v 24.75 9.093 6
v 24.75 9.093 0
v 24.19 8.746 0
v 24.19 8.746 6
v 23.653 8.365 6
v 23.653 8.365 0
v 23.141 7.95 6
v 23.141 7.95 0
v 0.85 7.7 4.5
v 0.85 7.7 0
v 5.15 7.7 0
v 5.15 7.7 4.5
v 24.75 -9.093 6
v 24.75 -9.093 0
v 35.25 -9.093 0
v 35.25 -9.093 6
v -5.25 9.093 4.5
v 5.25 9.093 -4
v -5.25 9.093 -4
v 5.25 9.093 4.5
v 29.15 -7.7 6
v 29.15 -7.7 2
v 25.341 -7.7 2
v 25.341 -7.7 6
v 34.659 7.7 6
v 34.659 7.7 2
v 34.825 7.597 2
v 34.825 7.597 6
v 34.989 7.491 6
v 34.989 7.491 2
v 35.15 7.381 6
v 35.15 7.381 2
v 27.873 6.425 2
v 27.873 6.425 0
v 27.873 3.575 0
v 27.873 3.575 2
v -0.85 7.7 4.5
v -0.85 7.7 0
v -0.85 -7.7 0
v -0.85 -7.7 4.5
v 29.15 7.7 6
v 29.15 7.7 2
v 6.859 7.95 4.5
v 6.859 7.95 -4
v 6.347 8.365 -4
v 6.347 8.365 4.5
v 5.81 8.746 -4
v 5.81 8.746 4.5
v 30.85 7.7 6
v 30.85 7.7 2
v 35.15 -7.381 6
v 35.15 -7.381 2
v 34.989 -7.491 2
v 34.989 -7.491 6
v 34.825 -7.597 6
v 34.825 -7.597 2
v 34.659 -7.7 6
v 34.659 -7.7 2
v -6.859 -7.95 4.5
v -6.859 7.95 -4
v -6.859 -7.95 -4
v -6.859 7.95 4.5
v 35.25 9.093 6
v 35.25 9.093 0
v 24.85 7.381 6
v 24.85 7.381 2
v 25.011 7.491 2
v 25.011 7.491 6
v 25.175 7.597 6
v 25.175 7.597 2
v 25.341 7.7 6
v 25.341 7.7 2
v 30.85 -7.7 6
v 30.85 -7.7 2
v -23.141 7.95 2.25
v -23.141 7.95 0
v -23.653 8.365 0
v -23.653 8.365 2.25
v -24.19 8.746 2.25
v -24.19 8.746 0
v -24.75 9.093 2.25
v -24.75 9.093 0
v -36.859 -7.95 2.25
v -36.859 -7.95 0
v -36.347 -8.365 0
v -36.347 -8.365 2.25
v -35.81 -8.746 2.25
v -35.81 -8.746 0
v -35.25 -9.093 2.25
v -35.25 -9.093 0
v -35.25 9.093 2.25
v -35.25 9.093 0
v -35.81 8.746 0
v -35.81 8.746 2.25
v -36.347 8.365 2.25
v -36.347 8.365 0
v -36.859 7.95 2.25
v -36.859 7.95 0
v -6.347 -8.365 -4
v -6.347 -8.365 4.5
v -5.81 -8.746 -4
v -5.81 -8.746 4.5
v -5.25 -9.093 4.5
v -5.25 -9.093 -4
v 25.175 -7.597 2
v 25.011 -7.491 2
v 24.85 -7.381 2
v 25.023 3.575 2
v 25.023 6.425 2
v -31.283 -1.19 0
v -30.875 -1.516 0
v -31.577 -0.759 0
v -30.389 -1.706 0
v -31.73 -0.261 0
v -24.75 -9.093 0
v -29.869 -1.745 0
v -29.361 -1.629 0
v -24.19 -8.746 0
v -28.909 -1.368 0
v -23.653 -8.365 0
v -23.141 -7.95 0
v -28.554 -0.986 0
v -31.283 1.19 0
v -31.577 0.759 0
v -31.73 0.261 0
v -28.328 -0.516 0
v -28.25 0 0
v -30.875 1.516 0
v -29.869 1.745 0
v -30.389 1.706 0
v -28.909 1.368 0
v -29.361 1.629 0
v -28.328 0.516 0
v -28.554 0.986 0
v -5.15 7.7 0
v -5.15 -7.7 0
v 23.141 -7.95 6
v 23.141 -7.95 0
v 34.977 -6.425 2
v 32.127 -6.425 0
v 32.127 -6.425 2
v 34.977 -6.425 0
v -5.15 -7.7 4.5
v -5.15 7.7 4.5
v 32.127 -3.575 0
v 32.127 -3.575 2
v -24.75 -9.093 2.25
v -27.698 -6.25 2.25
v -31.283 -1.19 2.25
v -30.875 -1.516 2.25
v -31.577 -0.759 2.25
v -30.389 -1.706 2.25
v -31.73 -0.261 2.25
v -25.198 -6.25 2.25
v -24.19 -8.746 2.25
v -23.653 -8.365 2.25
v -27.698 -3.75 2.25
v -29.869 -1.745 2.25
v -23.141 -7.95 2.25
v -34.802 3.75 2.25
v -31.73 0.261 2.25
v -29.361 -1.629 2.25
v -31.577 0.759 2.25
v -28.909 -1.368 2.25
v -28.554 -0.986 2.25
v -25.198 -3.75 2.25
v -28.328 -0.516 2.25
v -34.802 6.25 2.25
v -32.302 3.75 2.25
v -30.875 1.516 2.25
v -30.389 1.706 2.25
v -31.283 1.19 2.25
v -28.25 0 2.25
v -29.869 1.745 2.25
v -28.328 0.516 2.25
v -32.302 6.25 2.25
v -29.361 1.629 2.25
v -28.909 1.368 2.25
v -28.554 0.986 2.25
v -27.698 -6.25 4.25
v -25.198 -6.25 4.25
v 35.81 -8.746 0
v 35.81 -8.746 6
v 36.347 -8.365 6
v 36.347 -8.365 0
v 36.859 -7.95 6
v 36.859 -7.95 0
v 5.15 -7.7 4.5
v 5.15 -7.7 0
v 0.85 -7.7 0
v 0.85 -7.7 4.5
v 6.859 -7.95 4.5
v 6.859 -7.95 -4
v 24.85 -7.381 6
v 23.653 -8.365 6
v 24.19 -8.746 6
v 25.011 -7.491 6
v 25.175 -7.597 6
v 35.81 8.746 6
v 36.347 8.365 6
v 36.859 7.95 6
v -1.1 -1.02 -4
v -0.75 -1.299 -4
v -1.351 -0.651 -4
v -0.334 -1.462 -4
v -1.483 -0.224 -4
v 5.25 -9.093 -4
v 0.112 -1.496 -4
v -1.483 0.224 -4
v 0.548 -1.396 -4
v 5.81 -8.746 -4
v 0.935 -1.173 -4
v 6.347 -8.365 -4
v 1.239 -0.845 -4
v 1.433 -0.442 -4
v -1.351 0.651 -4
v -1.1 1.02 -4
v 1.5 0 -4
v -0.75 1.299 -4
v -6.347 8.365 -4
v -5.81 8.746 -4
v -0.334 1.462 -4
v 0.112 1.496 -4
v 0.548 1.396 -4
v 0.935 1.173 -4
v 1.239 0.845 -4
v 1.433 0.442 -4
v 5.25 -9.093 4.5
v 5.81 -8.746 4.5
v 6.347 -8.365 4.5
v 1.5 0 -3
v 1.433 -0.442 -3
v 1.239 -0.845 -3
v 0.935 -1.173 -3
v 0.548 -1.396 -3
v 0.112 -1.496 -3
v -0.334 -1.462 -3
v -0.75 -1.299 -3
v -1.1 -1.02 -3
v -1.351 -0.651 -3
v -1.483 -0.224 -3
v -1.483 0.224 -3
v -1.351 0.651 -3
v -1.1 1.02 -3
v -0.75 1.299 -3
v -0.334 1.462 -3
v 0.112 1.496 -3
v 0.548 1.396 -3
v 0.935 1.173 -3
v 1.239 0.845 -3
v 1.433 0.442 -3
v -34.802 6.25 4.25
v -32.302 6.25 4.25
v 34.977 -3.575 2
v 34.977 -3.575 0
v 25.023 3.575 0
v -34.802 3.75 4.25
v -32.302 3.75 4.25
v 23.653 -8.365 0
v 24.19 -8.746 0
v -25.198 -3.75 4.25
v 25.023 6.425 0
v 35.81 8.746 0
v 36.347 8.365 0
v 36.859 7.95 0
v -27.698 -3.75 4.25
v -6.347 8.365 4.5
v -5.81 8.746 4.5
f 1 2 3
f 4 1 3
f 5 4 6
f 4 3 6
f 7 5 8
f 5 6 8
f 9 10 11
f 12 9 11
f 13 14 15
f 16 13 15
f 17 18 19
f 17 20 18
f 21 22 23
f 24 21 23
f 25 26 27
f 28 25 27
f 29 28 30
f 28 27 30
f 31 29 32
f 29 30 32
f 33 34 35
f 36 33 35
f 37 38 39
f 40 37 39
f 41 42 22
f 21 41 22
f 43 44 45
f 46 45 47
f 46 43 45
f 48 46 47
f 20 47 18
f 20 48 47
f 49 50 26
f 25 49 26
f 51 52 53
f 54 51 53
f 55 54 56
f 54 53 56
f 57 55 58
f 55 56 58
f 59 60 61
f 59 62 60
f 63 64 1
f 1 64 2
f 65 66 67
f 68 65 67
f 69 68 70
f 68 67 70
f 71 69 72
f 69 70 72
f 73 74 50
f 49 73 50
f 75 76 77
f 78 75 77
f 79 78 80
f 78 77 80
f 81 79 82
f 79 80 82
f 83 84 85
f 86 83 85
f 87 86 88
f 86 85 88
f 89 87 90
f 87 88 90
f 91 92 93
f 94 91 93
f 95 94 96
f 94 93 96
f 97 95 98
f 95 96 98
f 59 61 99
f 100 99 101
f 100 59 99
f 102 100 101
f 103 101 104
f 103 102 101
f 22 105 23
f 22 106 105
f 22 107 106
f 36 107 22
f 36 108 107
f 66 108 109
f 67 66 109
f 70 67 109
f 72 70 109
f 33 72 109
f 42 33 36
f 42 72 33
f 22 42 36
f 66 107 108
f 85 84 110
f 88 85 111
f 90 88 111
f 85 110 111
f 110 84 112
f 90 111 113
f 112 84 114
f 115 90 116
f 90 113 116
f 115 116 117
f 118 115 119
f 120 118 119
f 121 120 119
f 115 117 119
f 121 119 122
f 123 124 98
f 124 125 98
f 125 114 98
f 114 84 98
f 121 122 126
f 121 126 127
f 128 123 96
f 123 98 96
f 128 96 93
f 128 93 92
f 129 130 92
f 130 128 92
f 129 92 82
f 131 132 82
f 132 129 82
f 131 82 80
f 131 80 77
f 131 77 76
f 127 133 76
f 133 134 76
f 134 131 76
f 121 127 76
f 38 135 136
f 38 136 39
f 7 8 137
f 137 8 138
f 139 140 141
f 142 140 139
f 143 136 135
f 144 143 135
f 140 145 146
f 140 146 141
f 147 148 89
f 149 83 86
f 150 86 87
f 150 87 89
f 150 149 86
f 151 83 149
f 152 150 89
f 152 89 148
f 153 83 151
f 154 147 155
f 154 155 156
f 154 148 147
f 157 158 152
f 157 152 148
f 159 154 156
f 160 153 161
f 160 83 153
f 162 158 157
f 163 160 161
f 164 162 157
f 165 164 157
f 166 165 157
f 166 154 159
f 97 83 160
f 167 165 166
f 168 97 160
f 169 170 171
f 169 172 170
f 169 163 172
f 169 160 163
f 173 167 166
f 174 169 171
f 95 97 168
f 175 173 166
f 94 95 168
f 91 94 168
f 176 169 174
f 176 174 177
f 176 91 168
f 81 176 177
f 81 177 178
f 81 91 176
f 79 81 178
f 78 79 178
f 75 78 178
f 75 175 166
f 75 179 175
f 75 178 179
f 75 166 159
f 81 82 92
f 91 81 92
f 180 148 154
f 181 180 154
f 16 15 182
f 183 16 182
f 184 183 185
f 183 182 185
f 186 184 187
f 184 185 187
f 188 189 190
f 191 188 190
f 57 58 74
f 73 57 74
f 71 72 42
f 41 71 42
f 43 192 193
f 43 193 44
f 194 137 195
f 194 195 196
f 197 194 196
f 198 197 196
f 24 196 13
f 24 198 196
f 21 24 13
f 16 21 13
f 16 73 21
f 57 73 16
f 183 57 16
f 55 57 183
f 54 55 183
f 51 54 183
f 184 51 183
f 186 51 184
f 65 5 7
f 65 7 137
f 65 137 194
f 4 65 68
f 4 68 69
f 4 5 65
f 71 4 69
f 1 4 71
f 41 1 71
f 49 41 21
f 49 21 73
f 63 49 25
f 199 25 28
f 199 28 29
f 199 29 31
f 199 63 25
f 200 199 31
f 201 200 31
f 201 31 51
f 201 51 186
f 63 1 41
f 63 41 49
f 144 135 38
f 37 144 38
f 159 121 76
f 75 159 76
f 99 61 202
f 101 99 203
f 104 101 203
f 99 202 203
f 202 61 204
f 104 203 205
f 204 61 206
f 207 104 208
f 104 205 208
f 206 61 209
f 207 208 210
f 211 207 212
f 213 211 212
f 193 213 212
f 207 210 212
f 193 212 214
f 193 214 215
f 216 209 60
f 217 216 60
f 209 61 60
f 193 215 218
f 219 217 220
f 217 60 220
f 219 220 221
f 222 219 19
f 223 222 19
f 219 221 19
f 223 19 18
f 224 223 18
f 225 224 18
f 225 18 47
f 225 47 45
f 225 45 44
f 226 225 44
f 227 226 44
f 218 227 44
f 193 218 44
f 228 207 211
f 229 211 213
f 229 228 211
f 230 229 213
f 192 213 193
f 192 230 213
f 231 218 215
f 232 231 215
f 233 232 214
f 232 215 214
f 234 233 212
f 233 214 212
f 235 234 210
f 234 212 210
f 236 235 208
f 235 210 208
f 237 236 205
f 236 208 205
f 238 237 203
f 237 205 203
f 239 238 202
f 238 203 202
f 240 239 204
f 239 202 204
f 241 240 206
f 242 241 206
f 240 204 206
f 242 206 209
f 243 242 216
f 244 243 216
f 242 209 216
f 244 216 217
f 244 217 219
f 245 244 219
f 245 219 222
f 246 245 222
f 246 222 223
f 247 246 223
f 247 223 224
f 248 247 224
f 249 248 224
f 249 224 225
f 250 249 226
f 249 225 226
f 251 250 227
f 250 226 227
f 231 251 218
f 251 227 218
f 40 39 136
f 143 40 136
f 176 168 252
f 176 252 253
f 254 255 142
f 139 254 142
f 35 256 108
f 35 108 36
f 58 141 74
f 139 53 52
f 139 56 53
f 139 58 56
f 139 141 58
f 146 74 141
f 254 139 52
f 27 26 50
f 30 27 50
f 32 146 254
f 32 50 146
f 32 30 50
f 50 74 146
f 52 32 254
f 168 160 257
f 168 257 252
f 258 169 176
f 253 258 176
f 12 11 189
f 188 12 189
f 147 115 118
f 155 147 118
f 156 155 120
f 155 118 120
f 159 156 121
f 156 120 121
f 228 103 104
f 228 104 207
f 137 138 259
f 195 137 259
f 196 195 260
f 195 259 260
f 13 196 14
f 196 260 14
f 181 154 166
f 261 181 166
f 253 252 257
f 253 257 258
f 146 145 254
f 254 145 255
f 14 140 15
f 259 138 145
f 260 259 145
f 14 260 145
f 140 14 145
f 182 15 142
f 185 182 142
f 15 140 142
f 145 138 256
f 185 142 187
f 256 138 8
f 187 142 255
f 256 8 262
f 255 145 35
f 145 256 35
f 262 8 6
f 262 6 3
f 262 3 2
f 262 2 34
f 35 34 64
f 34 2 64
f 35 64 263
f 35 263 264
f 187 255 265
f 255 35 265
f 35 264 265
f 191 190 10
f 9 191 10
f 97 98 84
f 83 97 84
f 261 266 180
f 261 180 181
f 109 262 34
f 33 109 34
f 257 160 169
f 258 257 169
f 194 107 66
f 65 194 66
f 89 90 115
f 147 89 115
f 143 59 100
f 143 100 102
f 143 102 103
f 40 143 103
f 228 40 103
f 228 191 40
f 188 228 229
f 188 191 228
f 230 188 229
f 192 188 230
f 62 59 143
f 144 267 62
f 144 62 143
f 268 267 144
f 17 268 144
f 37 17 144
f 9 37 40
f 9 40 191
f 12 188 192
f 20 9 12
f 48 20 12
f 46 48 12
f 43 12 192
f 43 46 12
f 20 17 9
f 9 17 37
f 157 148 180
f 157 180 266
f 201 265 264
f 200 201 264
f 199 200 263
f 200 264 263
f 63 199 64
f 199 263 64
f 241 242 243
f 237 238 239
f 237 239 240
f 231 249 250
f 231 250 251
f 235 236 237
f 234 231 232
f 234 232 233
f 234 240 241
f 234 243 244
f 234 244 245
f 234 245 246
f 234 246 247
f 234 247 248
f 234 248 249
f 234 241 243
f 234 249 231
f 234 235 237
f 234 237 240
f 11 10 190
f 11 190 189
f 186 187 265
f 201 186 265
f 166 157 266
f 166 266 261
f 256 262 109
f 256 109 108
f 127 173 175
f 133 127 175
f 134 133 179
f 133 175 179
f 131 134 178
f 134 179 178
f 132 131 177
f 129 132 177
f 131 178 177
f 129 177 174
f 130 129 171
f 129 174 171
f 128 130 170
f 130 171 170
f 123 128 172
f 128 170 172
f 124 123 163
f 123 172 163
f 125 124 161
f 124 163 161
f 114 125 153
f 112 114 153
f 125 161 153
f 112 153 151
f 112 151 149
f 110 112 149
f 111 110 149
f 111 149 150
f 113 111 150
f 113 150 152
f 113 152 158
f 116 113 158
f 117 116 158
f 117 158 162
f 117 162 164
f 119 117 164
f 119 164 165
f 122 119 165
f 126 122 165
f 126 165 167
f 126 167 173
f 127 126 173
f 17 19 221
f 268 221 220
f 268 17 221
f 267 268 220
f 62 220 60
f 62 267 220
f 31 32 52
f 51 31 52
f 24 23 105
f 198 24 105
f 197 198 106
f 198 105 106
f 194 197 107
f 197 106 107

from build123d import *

# Parameters (mm, degrees)
F1_DEPTH  = 4.5
F2_DEPTH  = 4
F3_R      = 1.5
F4_DEPTH  = 1
F5_DEPTH  = 2.25
F6_R      = 1.75
F7_DEPTH  = 25
F8_W      = 2.5
F8_H      = 2.5
F9_DEPTH  = 2
F10_DEPTH = 6
F11_DEPTH = 2
F12_W     = 2.85
F12_H     = 2.85
F13_DEPTH = 25


with BuildPart() as f1:
    # F0 (on Top) → F1 (new body)
    with BuildSketch(Plane.XY):
        with BuildLine():
            Line((6.8591180191, -5.8268773799), (6.8591180191, 5.8268773799))
            ThreePointArc((6.8591180191, 5.8268773799), (6.0546235017, 6.6589439292), (5.15, 7.3808874805))
            Line((5.15, 7.3808874805), (5.15, -7.3808874805))
            ThreePointArc((5.15, -7.3808874805), (6.0546235017, -6.6589439292), (6.8591180191, -5.8268773799))
        make_face()
        with BuildLine():
            Line((6.8591180191, 5.8268773799), (6.8591180191, 7.95))
            ThreePointArc((6.8591180191, 7.95), (6.0814841535, 8.5595298054), (5.25, 9.0932667397))
            Line((5.25, 9.0932667397), (-5.25, 9.0932667397))
            ThreePointArc((-5.25, 9.0932667397), (-6.0814841535, 8.5595298054), (-6.8591180191, 7.95))
            Line((-6.8591180191, 7.95), (-6.8591180191, 5.8268773799))
            ThreePointArc((-6.8591180191, 5.8268773799), (-6.0546235017, 6.6589439292), (-5.15, 7.3808874805))
            Line((-5.15, 7.3808874805), (-5.15, 7.7))
            Line((-5.15, 7.7), (-4.6593991029, 7.7))
            ThreePointArc((-4.6593991029, 7.7), (0, 9), (4.6593991029, 7.7))
            Line((4.6593991029, 7.7), (5.15, 7.7))
            Line((5.15, 7.7), (5.15, 7.3808874805))
            ThreePointArc((5.15, 7.3808874805), (6.0546235017, 6.6589439292), (6.8591180191, 5.8268773799))
        make_face()
        with BuildLine():
            Line((0.85, 7.7), (4.6593991029, 7.7))
            ThreePointArc((4.6593991029, 7.7), (0, 9), (-4.6593991029, 7.7))
            Line((-4.6593991029, 7.7), (-0.85, 7.7))
            Line((-0.85, 7.7), (-0.85, -7.7))
            Line((-0.85, -7.7), (-4.6593991029, -7.7))
            ThreePointArc((-4.6593991029, -7.7), (0, -9), (4.6593991029, -7.7))
            Line((4.6593991029, -7.7), (0.85, -7.7))
            Line((0.85, -7.7), (0.85, 7.7))
        make_face()
        with BuildLine():
            ThreePointArc((-5.15, 7.3808874805), (-6.0546235017, 6.6589439292), (-6.8591180191, 5.8268773799))
            Line((-6.8591180191, 5.8268773799), (-6.8591180191, -5.8268773799))
            ThreePointArc((-6.8591180191, -5.8268773799), (-6.0546235017, -6.6589439292), (-5.15, -7.3808874805))
            Line((-5.15, -7.3808874805), (-5.15, 7.3808874805))
        make_face()
        with BuildLine():
            ThreePointArc((5.25, -9.0932667397), (6.0814841535, -8.5595298054), (6.8591180191, -7.95))
            Line((6.8591180191, -7.95), (6.8591180191, -5.8268773799))
            ThreePointArc((6.8591180191, -5.8268773799), (6.0546235017, -6.6589439292), (5.15, -7.3808874805))
            Line((5.15, -7.3808874805), (5.15, -7.7))
            Line((5.15, -7.7), (4.6593991029, -7.7))
            ThreePointArc((4.6593991029, -7.7), (0, -9), (-4.6593991029, -7.7))
            Line((-4.6593991029, -7.7), (-5.15, -7.7))
            Line((-5.15, -7.7), (-5.15, -7.3808874805))
            ThreePointArc((-5.15, -7.3808874805), (-6.0546235017, -6.6589439292), (-6.8591180191, -5.8268773799))
            Line((-6.8591180191, -5.8268773799), (-6.8591180191, -7.95))
            ThreePointArc((-6.8591180191, -7.95), (-6.0814841535, -8.5595298054), (-5.25, -9.0932667397))
            Line((-5.25, -9.0932667397), (5.25, -9.0932667397))
        make_face()
    extrude(amount=F1_DEPTH)

    # F0 (on Top) → F2 (join)
    with BuildSketch(Plane.XY):
        with BuildLine():
            Line((5.15, -7.3808874805), (5.15, 7.3808874805))
            ThreePointArc((5.15, 7.3808874805), (4.9072941516, 7.5444326566), (4.6593991029, 7.7))
            Line((4.6593991029, 7.7), (0.85, 7.7))
            Line((0.85, 7.7), (0.85, -7.7))
            Line((0.85, -7.7), (4.6593991029, -7.7))
            ThreePointArc((4.6593991029, -7.7), (4.9072941516, -7.5444326566), (5.15, -7.3808874805))
        make_face()
        with BuildLine():
            Line((-0.85, 7.7), (-4.6593991029, 7.7))
            ThreePointArc((-4.6593991029, 7.7), (-4.9072941516, 7.5444326566), (-5.15, 7.3808874805))
            Line((-5.15, 7.3808874805), (-5.15, -7.3808874805))
            ThreePointArc((-5.15, -7.3808874805), (-4.9072941516, -7.5444326566), (-4.6593991029, -7.7))
            Line((-4.6593991029, -7.7), (-0.85, -7.7))
            Line((-0.85, -7.7), (-0.85, 7.7))
        make_face()
        with BuildLine():
            Line((0.85, 7.7), (4.6593991029, 7.7))
            ThreePointArc((4.6593991029, 7.7), (0, 9), (-4.6593991029, 7.7))
            Line((-4.6593991029, 7.7), (-0.85, 7.7))
            Line((-0.85, 7.7), (-0.85, -7.7))
            Line((-0.85, -7.7), (-4.6593991029, -7.7))
            ThreePointArc((-4.6593991029, -7.7), (0, -9), (4.6593991029, -7.7))
            Line((4.6593991029, -7.7), (0.85, -7.7))
            Line((0.85, -7.7), (0.85, 7.7))
        make_face()
        with BuildLine():
            Line((6.8591180191, 5.8268773799), (6.8591180191, 7.95))
            ThreePointArc((6.8591180191, 7.95), (6.0814841535, 8.5595298054), (5.25, 9.0932667397))
            Line((5.25, 9.0932667397), (-5.25, 9.0932667397))
            ThreePointArc((-5.25, 9.0932667397), (-6.0814841535, 8.5595298054), (-6.8591180191, 7.95))
            Line((-6.8591180191, 7.95), (-6.8591180191, 5.8268773799))
            ThreePointArc((-6.8591180191, 5.8268773799), (-6.0546235017, 6.6589439292), (-5.15, 7.3808874805))
            Line((-5.15, 7.3808874805), (-5.15, 7.7))
            Line((-5.15, 7.7), (-4.6593991029, 7.7))
            ThreePointArc((-4.6593991029, 7.7), (0, 9), (4.6593991029, 7.7))
            Line((4.6593991029, 7.7), (5.15, 7.7))
            Line((5.15, 7.7), (5.15, 7.3808874805))
            ThreePointArc((5.15, 7.3808874805), (6.0546235017, 6.6589439292), (6.8591180191, 5.8268773799))
        make_face()
        with BuildLine():
            Line((6.8591180191, -5.8268773799), (6.8591180191, 5.8268773799))
            ThreePointArc((6.8591180191, 5.8268773799), (6.0546235017, 6.6589439292), (5.15, 7.3808874805))
            Line((5.15, 7.3808874805), (5.15, -7.3808874805))
            ThreePointArc((5.15, -7.3808874805), (6.0546235017, -6.6589439292), (6.8591180191, -5.8268773799))
        make_face()
        with BuildLine():
            ThreePointArc((4.6593991029, 7.7), (4.9072941516, 7.5444326566), (5.15, 7.3808874805))
            Line((5.15, 7.3808874805), (5.15, 7.7))
            Line((5.15, 7.7), (4.6593991029, 7.7))
        make_face()
        with BuildLine():
            ThreePointArc((5.25, -9.0932667397), (6.0814841535, -8.5595298054), (6.8591180191, -7.95))
            Line((6.8591180191, -7.95), (6.8591180191, -5.8268773799))
            ThreePointArc((6.8591180191, -5.8268773799), (6.0546235017, -6.6589439292), (5.15, -7.3808874805))
            Line((5.15, -7.3808874805), (5.15, -7.7))
            Line((5.15, -7.7), (4.6593991029, -7.7))
            ThreePointArc((4.6593991029, -7.7), (0, -9), (-4.6593991029, -7.7))
            Line((-4.6593991029, -7.7), (-5.15, -7.7))
            Line((-5.15, -7.7), (-5.15, -7.3808874805))
            ThreePointArc((-5.15, -7.3808874805), (-6.0546235017, -6.6589439292), (-6.8591180191, -5.8268773799))
            Line((-6.8591180191, -5.8268773799), (-6.8591180191, -7.95))
            ThreePointArc((-6.8591180191, -7.95), (-6.0814841535, -8.5595298054), (-5.25, -9.0932667397))
            Line((-5.25, -9.0932667397), (5.25, -9.0932667397))
        make_face()
        with BuildLine():
            ThreePointArc((-5.15, 7.3808874805), (-6.0546235017, 6.6589439292), (-6.8591180191, 5.8268773799))
            Line((-6.8591180191, 5.8268773799), (-6.8591180191, -5.8268773799))
            ThreePointArc((-6.8591180191, -5.8268773799), (-6.0546235017, -6.6589439292), (-5.15, -7.3808874805))
            Line((-5.15, -7.3808874805), (-5.15, 7.3808874805))
        make_face()
        with BuildLine():
            ThreePointArc((-5.15, 7.3808874805), (-4.9072941516, 7.5444326566), (-4.6593991029, 7.7))
            Line((-4.6593991029, 7.7), (-5.15, 7.7))
            Line((-5.15, 7.7), (-5.15, 7.3808874805))
        make_face()
        with BuildLine():
            Line((-5.15, -7.7), (-4.6593991029, -7.7))
            ThreePointArc((-4.6593991029, -7.7), (-4.9072941516, -7.5444326566), (-5.15, -7.3808874805))
            Line((-5.15, -7.3808874805), (-5.15, -7.7))
        make_face()
        with BuildLine():
            Line((5.15, -7.7), (5.15, -7.3808874805))
            ThreePointArc((5.15, -7.3808874805), (4.9072941516, -7.5444326566), (4.6593991029, -7.7))
            Line((4.6593991029, -7.7), (5.15, -7.7))
        make_face()
    extrude(amount=-F2_DEPTH)

    # F3 (on face) → F4 (cut)
    with BuildSketch(Plane(origin=(0, 0, -4), x_dir=(1, 0, 0), z_dir=(0, 0, -1))):
        Circle(F3_R)
    extrude(amount=-F4_DEPTH, mode=Mode.SUBTRACT)


with BuildPart() as f5:
    # F0 (on Top) → F5 (new body)
    with BuildSketch(Plane.XY):
        with BuildLine():
            ThreePointArc((-35.25, 9.0932667397), (-36.0814841535, 8.5595298054), (-36.8591180191, 7.95))
            Line((-36.8591180191, 7.95), (-36.8591180191, 5.8268773799))
            ThreePointArc((-36.8591180191, 5.8268773799), (-36.0546235017, 6.6589439292), (-35.15, 7.3808874805))
            Line((-35.15, 7.3808874805), (-35.15, 7.7))
            Line((-35.15, 7.7), (-34.6593991029, 7.7))
            ThreePointArc((-34.6593991029, 7.7), (-30, 9), (-25.3406008971, 7.7))
            Line((-25.3406008971, 7.7), (-24.85, 7.7))
            Line((-24.85, 7.7), (-24.85, 7.3808874805))
            ThreePointArc((-24.85, 7.3808874805), (-23.9453764983, 6.6589439292), (-23.1408819809, 5.8268773799))
            Line((-23.1408819809, 5.8268773799), (-23.1408819809, 7.95))
            ThreePointArc((-23.1408819809, 7.95), (-23.9185158465, 8.5595298054), (-24.75, 9.0932667397))
            Line((-24.75, 9.0932667397), (-35.25, 9.0932667397))
        make_face()
        with BuildLine():
            Line((-36.8591180191, 5.8268773799), (-36.8591180191, -5.8268773799))
            ThreePointArc((-36.8591180191, -5.8268773799), (-36.0546235017, -6.6589439292), (-35.15, -7.3808874805))
            Line((-35.15, -7.3808874805), (-35.15, 7.3808874805))
            ThreePointArc((-35.15, 7.3808874805), (-36.0546235017, 6.6589439292), (-36.8591180191, 5.8268773799))
        make_face()
        with BuildLine():
            Line((-35.15, 7.7), (-35.15, 7.3808874805))
            ThreePointArc((-35.15, 7.3808874805), (-34.9072941516, 7.5444326566), (-34.6593991029, 7.7))
            Line((-34.6593991029, 7.7), (-35.15, 7.7))
        make_face()
        with BuildLine():
            ThreePointArc((-34.6593991029, -7.7), (-30, -9), (-25.3406008971, -7.7))
            Line((-25.3406008971, -7.7), (-29.15, -7.7))
            Line((-29.15, -7.7), (-29.15, 7.7))
            Line((-29.15, 7.7), (-25.3406008971, 7.7))
            ThreePointArc((-25.3406008971, 7.7), (-30, 9), (-34.6593991029, 7.7))
            Line((-34.6593991029, 7.7), (-30.85, 7.7))
            Line((-30.85, 7.7), (-30.85, -7.7))
            Line((-30.85, -7.7), (-34.6593991029, -7.7))
        make_face()
        with BuildLine():
            Line((-35.15, 7.3808874805), (-35.15, -7.3808874805))
            ThreePointArc((-35.15, -7.3808874805), (-34.9072941516, -7.5444326566), (-34.6593991029, -7.7))
            Line((-34.6593991029, -7.7), (-30.85, -7.7))
            Line((-30.85, -7.7), (-30.85, 7.7))
            Line((-30.85, 7.7), (-34.6593991029, 7.7))
            ThreePointArc((-34.6593991029, 7.7), (-34.9072941516, 7.5444326566), (-35.15, 7.3808874805))
        make_face()
        with BuildLine():
            ThreePointArc((-25.3406008971, -7.7), (-25.0927058484, -7.5444326566), (-24.85, -7.3808874805))
            Line((-24.85, -7.3808874805), (-24.85, 7.3808874805))
            ThreePointArc((-24.85, 7.3808874805), (-25.0927058484, 7.5444326566), (-25.3406008971, 7.7))
            Line((-25.3406008971, 7.7), (-29.15, 7.7))
            Line((-29.15, 7.7), (-29.15, -7.7))
            Line((-29.15, -7.7), (-25.3406008971, -7.7))
        make_face()
        with BuildLine():
            ThreePointArc((-25.3406008971, 7.7), (-25.0927058484, 7.5444326566), (-24.85, 7.3808874805))
            Line((-24.85, 7.3808874805), (-24.85, 7.7))
            Line((-24.85, 7.7), (-25.3406008971, 7.7))
        make_face()
        with BuildLine():
            ThreePointArc((-24.85, -7.3808874805), (-23.9453764983, -6.6589439292), (-23.1408819809, -5.8268773799))
            Line((-23.1408819809, -5.8268773799), (-23.1408819809, 5.8268773799))
            ThreePointArc((-23.1408819809, 5.8268773799), (-23.9453764983, 6.6589439292), (-24.85, 7.3808874805))
            Line((-24.85, 7.3808874805), (-24.85, -7.3808874805))
        make_face()
        with BuildLine():
            Line((-35.25, -9.0932667397), (-24.75, -9.0932667397))
            ThreePointArc((-24.75, -9.0932667397), (-23.9185158465, -8.5595298054), (-23.1408819809, -7.95))
            Line((-23.1408819809, -7.95), (-23.1408819809, -5.8268773799))
            ThreePointArc((-23.1408819809, -5.8268773799), (-23.9453764983, -6.6589439292), (-24.85, -7.3808874805))
            Line((-24.85, -7.3808874805), (-24.85, -7.7))
            Line((-24.85, -7.7), (-25.3406008971, -7.7))
            ThreePointArc((-25.3406008971, -7.7), (-30, -9), (-34.6593991029, -7.7))
            Line((-34.6593991029, -7.7), (-35.15, -7.7))
            Line((-35.15, -7.7), (-35.15, -7.3808874805))
            ThreePointArc((-35.15, -7.3808874805), (-36.0546235017, -6.6589439292), (-36.8591180191, -5.8268773799))
            Line((-36.8591180191, -5.8268773799), (-36.8591180191, -7.95))
            ThreePointArc((-36.8591180191, -7.95), (-36.0814841535, -8.5595298054), (-35.25, -9.0932667397))
        make_face()
        with BuildLine():
            Line((-24.85, -7.7), (-24.85, -7.3808874805))
            ThreePointArc((-24.85, -7.3808874805), (-25.0927058484, -7.5444326566), (-25.3406008971, -7.7))
            Line((-25.3406008971, -7.7), (-24.85, -7.7))
        make_face()
        with BuildLine():
            ThreePointArc((-34.6593991029, -7.7), (-34.9072941516, -7.5444326566), (-35.15, -7.3808874805))
            Line((-35.15, -7.3808874805), (-35.15, -7.7))
            Line((-35.15, -7.7), (-34.6593991029, -7.7))
        make_face()
    extrude(amount=F5_DEPTH)

    # F6 (on face) → F7 (cut)
    with BuildSketch(Plane.XY.offset(2.25)):
        with Locations((-30, 0)):
            Circle(F6_R)
    extrude(amount=-F7_DEPTH, mode=Mode.SUBTRACT)

    # F8 (on face) → F9 (join)
    with BuildSketch(Plane.XY.offset(2.25)):
        with Locations((-33.5524639155, 5)):
            Rectangle(F8_W, F8_H)
        with Locations((-26.4475360845, -5)):
            Rectangle(F8_W, F8_H)
    extrude(amount=F9_DEPTH)


with BuildPart() as f10:
    # F0 (on Top) → F10 (new body)
    with BuildSketch(Plane.XY):
        with BuildLine():
            ThreePointArc((25.3406008971, -7.7), (30, -9), (34.6593991029, -7.7))
            Line((34.6593991029, -7.7), (30.85, -7.7))
            Line((30.85, -7.7), (30.85, 7.7))
            Line((30.85, 7.7), (34.6593991029, 7.7))
            ThreePointArc((34.6593991029, 7.7), (30, 9), (25.3406008971, 7.7))
            Line((25.3406008971, 7.7), (29.15, 7.7))
            Line((29.15, 7.7), (29.15, -7.7))
            Line((29.15, -7.7), (25.3406008971, -7.7))
        make_face()
        with BuildLine():
            Line((24.75, -9.0932667397), (35.25, -9.0932667397))
            ThreePointArc((35.25, -9.0932667397), (36.0814841535, -8.5595298054), (36.8591180191, -7.95))
            Line((36.8591180191, -7.95), (36.8591180191, -5.8268773799))
            ThreePointArc((36.8591180191, -5.8268773799), (36.0546235017, -6.6589439292), (35.15, -7.3808874805))
            Line((35.15, -7.3808874805), (35.15, -7.7))
            Line((35.15, -7.7), (34.6593991029, -7.7))
            ThreePointArc((34.6593991029, -7.7), (30, -9), (25.3406008971, -7.7))
            Line((25.3406008971, -7.7), (24.85, -7.7))
            Line((24.85, -7.7), (24.85, -7.3808874805))
            ThreePointArc((24.85, -7.3808874805), (23.9453764983, -6.6589439292), (23.1408819809, -5.8268773799))
            Line((23.1408819809, -5.8268773799), (23.1408819809, -7.95))
            ThreePointArc((23.1408819809, -7.95), (23.9185158465, -8.5595298054), (24.75, -9.0932667397))
        make_face()
        with BuildLine():
            ThreePointArc((35.15, -7.3808874805), (36.0546235017, -6.6589439292), (36.8591180191, -5.8268773799))
            Line((36.8591180191, -5.8268773799), (36.8591180191, 5.8268773799))
            ThreePointArc((36.8591180191, 5.8268773799), (36.0546235017, 6.6589439292), (35.15, 7.3808874805))
            Line((35.15, 7.3808874805), (35.15, -7.3808874805))
        make_face()
        with BuildLine():
            ThreePointArc((24.75, 9.0932667397), (23.9185158465, 8.5595298054), (23.1408819809, 7.95))
            Line((23.1408819809, 7.95), (23.1408819809, 5.8268773799))
            ThreePointArc((23.1408819809, 5.8268773799), (23.9453764983, 6.6589439292), (24.85, 7.3808874805))
            Line((24.85, 7.3808874805), (24.85, 7.7))
            Line((24.85, 7.7), (25.3406008971, 7.7))
            ThreePointArc((25.3406008971, 7.7), (30, 9), (34.6593991029, 7.7))
            Line((34.6593991029, 7.7), (35.15, 7.7))
            Line((35.15, 7.7), (35.15, 7.3808874805))
            ThreePointArc((35.15, 7.3808874805), (36.0546235017, 6.6589439292), (36.8591180191, 5.8268773799))
            Line((36.8591180191, 5.8268773799), (36.8591180191, 7.95))
            ThreePointArc((36.8591180191, 7.95), (36.0814841535, 8.5595298054), (35.25, 9.0932667397))
            Line((35.25, 9.0932667397), (24.75, 9.0932667397))
        make_face()
        with BuildLine():
            Line((23.1408819809, 5.8268773799), (23.1408819809, -5.8268773799))
            ThreePointArc((23.1408819809, -5.8268773799), (23.9453764983, -6.6589439292), (24.85, -7.3808874805))
            Line((24.85, -7.3808874805), (24.85, 7.3808874805))
            ThreePointArc((24.85, 7.3808874805), (23.9453764983, 6.6589439292), (23.1408819809, 5.8268773799))
        make_face()
        with BuildLine():
            Line((24.85, 7.7), (24.85, 7.3808874805))
            ThreePointArc((24.85, 7.3808874805), (25.0927058484, 7.5444326566), (25.3406008971, 7.7))
            Line((25.3406008971, 7.7), (24.85, 7.7))
        make_face()
        with BuildLine():
            ThreePointArc((34.6593991029, 7.7), (34.9072941516, 7.5444326566), (35.15, 7.3808874805))
            Line((35.15, 7.3808874805), (35.15, 7.7))
            Line((35.15, 7.7), (34.6593991029, 7.7))
        make_face()
        with BuildLine():
            Line((35.15, -7.7), (35.15, -7.3808874805))
            ThreePointArc((35.15, -7.3808874805), (34.9072941516, -7.5444326566), (34.6593991029, -7.7))
            Line((34.6593991029, -7.7), (35.15, -7.7))
        make_face()
        with BuildLine():
            ThreePointArc((25.3406008971, -7.7), (25.0927058484, -7.5444326566), (24.85, -7.3808874805))
            Line((24.85, -7.3808874805), (24.85, -7.7))
            Line((24.85, -7.7), (25.3406008971, -7.7))
        make_face()
    extrude(amount=F10_DEPTH)

    # F0 (on Top) → F11 (join)
    with BuildSketch(Plane.XY):
        with BuildLine():
            Line((23.1408819809, 5.8268773799), (23.1408819809, -5.8268773799))
            ThreePointArc((23.1408819809, -5.8268773799), (23.9453764983, -6.6589439292), (24.85, -7.3808874805))
            Line((24.85, -7.3808874805), (24.85, 7.3808874805))
            ThreePointArc((24.85, 7.3808874805), (23.9453764983, 6.6589439292), (23.1408819809, 5.8268773799))
        make_face()
        with BuildLine():
            Line((24.85, 7.3808874805), (24.85, -7.3808874805))
            ThreePointArc((24.85, -7.3808874805), (25.0927058484, -7.5444326566), (25.3406008971, -7.7))
            Line((25.3406008971, -7.7), (29.15, -7.7))
            Line((29.15, -7.7), (29.15, 7.7))
            Line((29.15, 7.7), (25.3406008971, 7.7))
            ThreePointArc((25.3406008971, 7.7), (25.0927058484, 7.5444326566), (24.85, 7.3808874805))
        make_face()
        with BuildLine():
            ThreePointArc((25.3406008971, -7.7), (30, -9), (34.6593991029, -7.7))
            Line((34.6593991029, -7.7), (30.85, -7.7))
            Line((30.85, -7.7), (30.85, 7.7))
            Line((30.85, 7.7), (34.6593991029, 7.7))
            ThreePointArc((34.6593991029, 7.7), (30, 9), (25.3406008971, 7.7))
            Line((25.3406008971, 7.7), (29.15, 7.7))
            Line((29.15, 7.7), (29.15, -7.7))
            Line((29.15, -7.7), (25.3406008971, -7.7))
        make_face()
        with BuildLine():
            ThreePointArc((34.6593991029, -7.7), (34.9072941516, -7.5444326566), (35.15, -7.3808874805))
            Line((35.15, -7.3808874805), (35.15, 7.3808874805))
            ThreePointArc((35.15, 7.3808874805), (34.9072941516, 7.5444326566), (34.6593991029, 7.7))
            Line((34.6593991029, 7.7), (30.85, 7.7))
            Line((30.85, 7.7), (30.85, -7.7))
            Line((30.85, -7.7), (34.6593991029, -7.7))
        make_face()
        with BuildLine():
            Line((24.75, -9.0932667397), (35.25, -9.0932667397))
            ThreePointArc((35.25, -9.0932667397), (36.0814841535, -8.5595298054), (36.8591180191, -7.95))
            Line((36.8591180191, -7.95), (36.8591180191, -5.8268773799))
            ThreePointArc((36.8591180191, -5.8268773799), (36.0546235017, -6.6589439292), (35.15, -7.3808874805))
            Line((35.15, -7.3808874805), (35.15, -7.7))
            Line((35.15, -7.7), (34.6593991029, -7.7))
            ThreePointArc((34.6593991029, -7.7), (30, -9), (25.3406008971, -7.7))
            Line((25.3406008971, -7.7), (24.85, -7.7))
            Line((24.85, -7.7), (24.85, -7.3808874805))
            ThreePointArc((24.85, -7.3808874805), (23.9453764983, -6.6589439292), (23.1408819809, -5.8268773799))
            Line((23.1408819809, -5.8268773799), (23.1408819809, -7.95))
            ThreePointArc((23.1408819809, -7.95), (23.9185158465, -8.5595298054), (24.75, -9.0932667397))
        make_face()
        with BuildLine():
            ThreePointArc((35.15, -7.3808874805), (36.0546235017, -6.6589439292), (36.8591180191, -5.8268773799))
            Line((36.8591180191, -5.8268773799), (36.8591180191, 5.8268773799))
            ThreePointArc((36.8591180191, 5.8268773799), (36.0546235017, 6.6589439292), (35.15, 7.3808874805))
            Line((35.15, 7.3808874805), (35.15, -7.3808874805))
        make_face()
        with BuildLine():
            ThreePointArc((24.75, 9.0932667397), (23.9185158465, 8.5595298054), (23.1408819809, 7.95))
            Line((23.1408819809, 7.95), (23.1408819809, 5.8268773799))
            ThreePointArc((23.1408819809, 5.8268773799), (23.9453764983, 6.6589439292), (24.85, 7.3808874805))
            Line((24.85, 7.3808874805), (24.85, 7.7))
            Line((24.85, 7.7), (25.3406008971, 7.7))
            ThreePointArc((25.3406008971, 7.7), (30, 9), (34.6593991029, 7.7))
            Line((34.6593991029, 7.7), (35.15, 7.7))
            Line((35.15, 7.7), (35.15, 7.3808874805))
            ThreePointArc((35.15, 7.3808874805), (36.0546235017, 6.6589439292), (36.8591180191, 5.8268773799))
            Line((36.8591180191, 5.8268773799), (36.8591180191, 7.95))
            ThreePointArc((36.8591180191, 7.95), (36.0814841535, 8.5595298054), (35.25, 9.0932667397))
            Line((35.25, 9.0932667397), (24.75, 9.0932667397))
        make_face()
        with BuildLine():
            ThreePointArc((34.6593991029, 7.7), (34.9072941516, 7.5444326566), (35.15, 7.3808874805))
            Line((35.15, 7.3808874805), (35.15, 7.7))
            Line((35.15, 7.7), (34.6593991029, 7.7))
        make_face()
        with BuildLine():
            Line((24.85, 7.7), (24.85, 7.3808874805))
            ThreePointArc((24.85, 7.3808874805), (25.0927058484, 7.5444326566), (25.3406008971, 7.7))
            Line((25.3406008971, 7.7), (24.85, 7.7))
        make_face()
        with BuildLine():
            ThreePointArc((25.3406008971, -7.7), (25.0927058484, -7.5444326566), (24.85, -7.3808874805))
            Line((24.85, -7.3808874805), (24.85, -7.7))
            Line((24.85, -7.7), (25.3406008971, -7.7))
        make_face()
        with BuildLine():
            Line((35.15, -7.7), (35.15, -7.3808874805))
            ThreePointArc((35.15, -7.3808874805), (34.9072941516, -7.5444326566), (34.6593991029, -7.7))
            Line((34.6593991029, -7.7), (35.15, -7.7))
        make_face()
    extrude(amount=F11_DEPTH)

    # F12 (on face) → F13 (cut)
    with BuildSketch(Plane(origin=(0, 0, 0), x_dir=(1, 0, 0), z_dir=(0, 0, -1))):
        with Locations((33.5524639155, 5)):
            Rectangle(F12_W, F12_H)
        with Locations((26.4475360845, -5)):
            Rectangle(F12_W, F12_H)
    extrude(amount=-F13_DEPTH, mode=Mode.SUBTRACT)


solid = Compound([f1.part, f5.part, f10.part])
